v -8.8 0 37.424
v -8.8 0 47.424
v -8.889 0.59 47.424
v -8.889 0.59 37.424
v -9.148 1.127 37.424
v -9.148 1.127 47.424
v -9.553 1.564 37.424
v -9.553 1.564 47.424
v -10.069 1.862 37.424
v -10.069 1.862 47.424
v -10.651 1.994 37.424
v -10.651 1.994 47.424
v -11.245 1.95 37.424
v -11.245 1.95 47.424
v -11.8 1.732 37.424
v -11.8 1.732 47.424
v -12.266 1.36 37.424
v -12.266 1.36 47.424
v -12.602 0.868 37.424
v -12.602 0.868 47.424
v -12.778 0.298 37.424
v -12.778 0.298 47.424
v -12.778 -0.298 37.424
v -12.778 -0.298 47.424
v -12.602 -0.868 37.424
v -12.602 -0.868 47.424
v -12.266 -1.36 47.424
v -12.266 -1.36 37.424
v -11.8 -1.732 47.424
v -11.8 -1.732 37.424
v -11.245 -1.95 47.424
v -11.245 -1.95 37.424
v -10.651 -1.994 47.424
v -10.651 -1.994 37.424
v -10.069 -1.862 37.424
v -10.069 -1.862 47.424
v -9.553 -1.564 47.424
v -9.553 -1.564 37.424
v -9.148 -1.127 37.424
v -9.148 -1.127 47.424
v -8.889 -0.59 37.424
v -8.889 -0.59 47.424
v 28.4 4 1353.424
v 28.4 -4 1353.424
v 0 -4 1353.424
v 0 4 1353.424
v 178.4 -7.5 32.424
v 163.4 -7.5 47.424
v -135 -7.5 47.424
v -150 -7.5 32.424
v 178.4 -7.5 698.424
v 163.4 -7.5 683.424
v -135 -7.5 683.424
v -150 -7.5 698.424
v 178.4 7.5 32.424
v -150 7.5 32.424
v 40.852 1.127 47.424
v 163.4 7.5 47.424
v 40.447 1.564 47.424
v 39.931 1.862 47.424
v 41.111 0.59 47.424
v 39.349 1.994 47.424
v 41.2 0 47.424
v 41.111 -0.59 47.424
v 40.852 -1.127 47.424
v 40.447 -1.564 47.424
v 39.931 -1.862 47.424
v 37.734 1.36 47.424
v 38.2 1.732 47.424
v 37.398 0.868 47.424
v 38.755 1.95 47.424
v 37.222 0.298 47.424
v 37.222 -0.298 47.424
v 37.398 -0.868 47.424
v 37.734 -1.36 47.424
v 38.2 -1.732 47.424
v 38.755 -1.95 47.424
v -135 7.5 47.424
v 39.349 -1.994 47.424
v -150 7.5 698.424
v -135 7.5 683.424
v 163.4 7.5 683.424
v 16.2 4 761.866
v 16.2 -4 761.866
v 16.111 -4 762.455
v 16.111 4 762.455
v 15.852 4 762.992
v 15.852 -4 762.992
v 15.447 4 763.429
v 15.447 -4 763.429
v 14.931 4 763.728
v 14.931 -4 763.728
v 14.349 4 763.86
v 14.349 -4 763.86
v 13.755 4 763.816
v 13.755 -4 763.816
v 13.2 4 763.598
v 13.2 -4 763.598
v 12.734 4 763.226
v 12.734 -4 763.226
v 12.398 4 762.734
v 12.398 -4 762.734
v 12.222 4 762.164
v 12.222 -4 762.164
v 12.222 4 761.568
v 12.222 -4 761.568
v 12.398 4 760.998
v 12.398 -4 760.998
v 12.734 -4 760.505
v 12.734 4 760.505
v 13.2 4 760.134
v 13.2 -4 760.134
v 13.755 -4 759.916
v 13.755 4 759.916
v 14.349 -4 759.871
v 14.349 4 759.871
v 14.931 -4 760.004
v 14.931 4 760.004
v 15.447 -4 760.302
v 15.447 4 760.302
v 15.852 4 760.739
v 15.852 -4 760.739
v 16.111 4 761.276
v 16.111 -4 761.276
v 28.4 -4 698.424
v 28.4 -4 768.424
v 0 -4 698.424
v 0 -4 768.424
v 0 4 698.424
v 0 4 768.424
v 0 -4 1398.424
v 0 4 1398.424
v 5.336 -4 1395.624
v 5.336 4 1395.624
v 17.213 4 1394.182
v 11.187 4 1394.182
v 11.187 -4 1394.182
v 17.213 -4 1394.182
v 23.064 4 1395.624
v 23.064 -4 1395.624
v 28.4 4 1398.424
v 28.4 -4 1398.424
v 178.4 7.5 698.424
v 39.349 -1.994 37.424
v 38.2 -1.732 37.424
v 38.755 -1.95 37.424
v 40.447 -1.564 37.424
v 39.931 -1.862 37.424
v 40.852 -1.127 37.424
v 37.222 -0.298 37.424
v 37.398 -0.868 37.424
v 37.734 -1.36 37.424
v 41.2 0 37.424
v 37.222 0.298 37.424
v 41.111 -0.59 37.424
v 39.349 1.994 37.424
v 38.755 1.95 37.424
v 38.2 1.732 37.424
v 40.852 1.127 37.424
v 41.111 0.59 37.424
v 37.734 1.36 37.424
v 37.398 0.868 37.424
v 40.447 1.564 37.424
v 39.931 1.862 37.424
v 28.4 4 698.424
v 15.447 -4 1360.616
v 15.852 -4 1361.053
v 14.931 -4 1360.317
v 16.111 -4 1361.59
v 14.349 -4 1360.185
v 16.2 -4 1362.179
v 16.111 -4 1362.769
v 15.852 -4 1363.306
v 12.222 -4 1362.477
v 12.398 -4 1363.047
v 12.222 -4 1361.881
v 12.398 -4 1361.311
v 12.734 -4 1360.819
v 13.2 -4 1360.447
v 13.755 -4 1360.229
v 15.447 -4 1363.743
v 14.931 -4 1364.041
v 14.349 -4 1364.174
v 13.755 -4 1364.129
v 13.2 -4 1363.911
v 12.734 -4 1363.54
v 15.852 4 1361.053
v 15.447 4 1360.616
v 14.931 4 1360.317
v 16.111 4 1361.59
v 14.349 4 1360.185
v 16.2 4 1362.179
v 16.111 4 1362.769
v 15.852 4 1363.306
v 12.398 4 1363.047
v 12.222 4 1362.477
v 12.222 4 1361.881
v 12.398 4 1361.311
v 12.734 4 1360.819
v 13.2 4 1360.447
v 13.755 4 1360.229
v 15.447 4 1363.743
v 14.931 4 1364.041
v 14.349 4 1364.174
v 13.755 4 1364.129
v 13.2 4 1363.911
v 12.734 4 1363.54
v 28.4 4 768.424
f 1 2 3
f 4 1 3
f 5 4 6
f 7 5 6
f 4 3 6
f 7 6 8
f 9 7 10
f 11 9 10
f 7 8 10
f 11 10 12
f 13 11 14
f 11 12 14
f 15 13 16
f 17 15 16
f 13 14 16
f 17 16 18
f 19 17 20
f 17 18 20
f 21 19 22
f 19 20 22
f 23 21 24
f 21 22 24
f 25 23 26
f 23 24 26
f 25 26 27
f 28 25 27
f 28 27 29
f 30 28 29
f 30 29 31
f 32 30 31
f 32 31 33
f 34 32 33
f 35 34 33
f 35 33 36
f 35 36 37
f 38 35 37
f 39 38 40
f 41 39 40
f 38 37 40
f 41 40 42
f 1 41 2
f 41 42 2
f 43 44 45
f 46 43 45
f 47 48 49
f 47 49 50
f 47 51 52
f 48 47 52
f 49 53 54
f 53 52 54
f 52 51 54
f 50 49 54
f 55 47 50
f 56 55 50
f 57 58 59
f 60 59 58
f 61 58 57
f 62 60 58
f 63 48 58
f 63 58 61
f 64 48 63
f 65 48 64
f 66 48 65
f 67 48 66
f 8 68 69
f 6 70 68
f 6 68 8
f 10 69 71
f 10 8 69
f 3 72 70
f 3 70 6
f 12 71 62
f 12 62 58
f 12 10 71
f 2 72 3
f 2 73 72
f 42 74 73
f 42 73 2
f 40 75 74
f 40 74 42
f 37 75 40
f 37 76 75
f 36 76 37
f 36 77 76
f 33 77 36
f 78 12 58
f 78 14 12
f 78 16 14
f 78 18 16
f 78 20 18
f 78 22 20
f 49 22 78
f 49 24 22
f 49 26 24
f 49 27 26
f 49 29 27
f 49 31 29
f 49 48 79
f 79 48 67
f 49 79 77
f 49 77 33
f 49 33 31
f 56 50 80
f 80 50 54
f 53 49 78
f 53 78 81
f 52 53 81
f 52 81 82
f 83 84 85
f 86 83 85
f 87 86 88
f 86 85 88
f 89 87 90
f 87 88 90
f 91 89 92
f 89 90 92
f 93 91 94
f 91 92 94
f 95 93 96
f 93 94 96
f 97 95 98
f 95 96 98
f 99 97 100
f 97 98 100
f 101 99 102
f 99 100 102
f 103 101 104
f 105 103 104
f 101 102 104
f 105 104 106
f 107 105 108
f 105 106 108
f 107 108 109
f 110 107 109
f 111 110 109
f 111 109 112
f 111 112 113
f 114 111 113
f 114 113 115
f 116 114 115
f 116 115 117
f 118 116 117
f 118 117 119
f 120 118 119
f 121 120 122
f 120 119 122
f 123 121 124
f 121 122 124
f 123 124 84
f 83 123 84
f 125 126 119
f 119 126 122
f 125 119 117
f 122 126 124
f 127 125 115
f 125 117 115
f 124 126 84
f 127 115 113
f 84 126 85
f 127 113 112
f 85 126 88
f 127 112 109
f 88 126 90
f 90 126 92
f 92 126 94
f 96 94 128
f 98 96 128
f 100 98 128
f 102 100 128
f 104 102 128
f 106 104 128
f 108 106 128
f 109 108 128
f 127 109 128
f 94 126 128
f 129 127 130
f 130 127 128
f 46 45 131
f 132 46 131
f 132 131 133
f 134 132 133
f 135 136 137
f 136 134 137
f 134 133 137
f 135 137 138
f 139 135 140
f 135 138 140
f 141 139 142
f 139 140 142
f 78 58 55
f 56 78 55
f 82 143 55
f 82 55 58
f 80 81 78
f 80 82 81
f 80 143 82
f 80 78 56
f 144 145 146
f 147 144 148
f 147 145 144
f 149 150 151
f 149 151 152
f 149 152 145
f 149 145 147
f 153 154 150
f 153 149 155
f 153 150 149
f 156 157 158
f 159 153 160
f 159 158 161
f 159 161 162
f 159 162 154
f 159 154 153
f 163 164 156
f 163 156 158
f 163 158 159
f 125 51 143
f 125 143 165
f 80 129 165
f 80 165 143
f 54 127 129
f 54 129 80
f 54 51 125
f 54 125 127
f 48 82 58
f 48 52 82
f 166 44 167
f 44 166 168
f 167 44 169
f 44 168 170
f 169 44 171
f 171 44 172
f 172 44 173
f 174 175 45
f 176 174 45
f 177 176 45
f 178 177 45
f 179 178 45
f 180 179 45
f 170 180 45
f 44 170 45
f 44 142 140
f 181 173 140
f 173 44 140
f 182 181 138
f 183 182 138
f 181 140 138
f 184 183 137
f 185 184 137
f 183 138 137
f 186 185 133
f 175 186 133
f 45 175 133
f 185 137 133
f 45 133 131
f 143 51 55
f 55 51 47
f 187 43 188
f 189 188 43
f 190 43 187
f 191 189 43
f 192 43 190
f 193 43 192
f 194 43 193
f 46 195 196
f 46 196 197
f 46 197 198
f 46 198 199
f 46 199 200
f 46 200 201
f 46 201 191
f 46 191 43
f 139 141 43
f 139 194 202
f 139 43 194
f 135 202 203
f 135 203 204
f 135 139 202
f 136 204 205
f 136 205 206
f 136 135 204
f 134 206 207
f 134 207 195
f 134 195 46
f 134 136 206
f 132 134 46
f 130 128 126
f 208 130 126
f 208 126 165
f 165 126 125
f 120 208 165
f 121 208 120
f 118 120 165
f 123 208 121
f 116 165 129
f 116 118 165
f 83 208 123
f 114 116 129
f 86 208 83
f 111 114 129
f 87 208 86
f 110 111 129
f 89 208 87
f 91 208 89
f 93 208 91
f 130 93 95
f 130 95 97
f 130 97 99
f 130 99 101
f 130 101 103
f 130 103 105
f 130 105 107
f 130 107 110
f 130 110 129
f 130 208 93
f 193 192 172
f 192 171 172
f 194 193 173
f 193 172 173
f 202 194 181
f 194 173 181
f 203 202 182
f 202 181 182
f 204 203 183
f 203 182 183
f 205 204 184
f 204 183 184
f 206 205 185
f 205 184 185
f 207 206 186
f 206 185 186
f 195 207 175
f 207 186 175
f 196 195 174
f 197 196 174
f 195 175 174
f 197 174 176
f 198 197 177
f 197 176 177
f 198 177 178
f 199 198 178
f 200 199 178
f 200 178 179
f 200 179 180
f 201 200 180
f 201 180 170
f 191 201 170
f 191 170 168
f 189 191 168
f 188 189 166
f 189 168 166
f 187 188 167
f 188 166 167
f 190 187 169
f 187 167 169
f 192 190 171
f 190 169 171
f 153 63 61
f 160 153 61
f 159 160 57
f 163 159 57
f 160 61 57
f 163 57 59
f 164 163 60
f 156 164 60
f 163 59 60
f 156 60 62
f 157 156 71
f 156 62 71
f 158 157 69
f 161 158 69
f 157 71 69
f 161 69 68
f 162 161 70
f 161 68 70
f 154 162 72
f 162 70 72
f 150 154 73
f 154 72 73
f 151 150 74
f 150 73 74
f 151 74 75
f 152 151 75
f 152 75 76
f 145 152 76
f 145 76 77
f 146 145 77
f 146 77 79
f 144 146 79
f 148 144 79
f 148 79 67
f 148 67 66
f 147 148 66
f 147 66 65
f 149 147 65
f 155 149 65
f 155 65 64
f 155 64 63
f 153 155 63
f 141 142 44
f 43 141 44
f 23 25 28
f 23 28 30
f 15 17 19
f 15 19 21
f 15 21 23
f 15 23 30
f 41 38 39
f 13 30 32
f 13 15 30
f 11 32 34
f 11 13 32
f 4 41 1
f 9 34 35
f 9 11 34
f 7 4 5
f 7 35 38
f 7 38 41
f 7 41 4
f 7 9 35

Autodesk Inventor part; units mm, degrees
ref_plane "YZ Plane" through (0, 0, 0) normal (1, 0, 0) x (0, 1, 0)
ref_plane "XZ Plane" through (0, 0, 0) normal (0, 1, 0) x (-1, 0, 0)
sketch "Boceto2" plane through (0, 0, 0) normal (0, 1, 0) x (-1, 0, 0)
  line L0 (350, 0) -> (-350, 0)
  line L1 (-350, 0) -> (-350, 1000)
  line L2 (-120, 1500) -> (80, 1500)
  line L3 (350, 1000) -> (350, 0)
  line L4 (80, 1000) -> (80, 1500)
  line L5 (-120, 1000) -> (-120, 1500)
  line L6 (350, 1000) -> (80, 1000)
  line L7 (-120, 1000) -> (-350, 1000)
  arc A0 (-28.4, 1398.4243) -> (0, 1398.4243) centre (-14.2, 1419) ccw
  line L8 (-28.4, 1398.4243) -> (-28.4, 698.4243)
  line L9 (-28.4, 698.4243) -> (0, 698.4243)
  line L10 (0, 698.4243) -> (0, 1398.4243)
  line L11 (150, 698.4243) -> (-178.4, 698.4243)
  line L12 (-178.4, 698.4243) -> (-178.4, 32.4243)
  line L13 (-178.4, 32.4243) -> (150, 32.4243)
  line L14 (150, 32.4243) -> (150, 698.4243)
  point P0 (-14.2, 698.4243)
  dimension "d16" = 105.8
  dimension "d17" = 81
  dimension "d18" = 700
  dimension "d19" = 28.4
  dimension "d21" = 666
  dimension "d22" = 150
  dimension "d23" = 150
  dimension "d24" = 0
extrude "Extrusión1" add sketch "Boceto2" along normal mid plane 15 contours L9 L11 L14 L13 L12
extrude "Extrusión2" add sketch "Boceto2" along normal mid plane 8 contours A0 L10 L9 L8
sketch "Boceto3" plane through (0, -7.5, 0) normal (0, -1, 0) x (1, 0, 0)
  line L0 (-150, 698.4243) -> (178.4, 698.4243) projected
  line L1 (178.4, 698.4243) -> (178.4, 32.4243) projected
  line L2 (-150, 698.4243) -> (178.4, 698.4243)
  line L3 (178.4, 698.4243) -> (178.4, 32.4243)
  line L4 (178.4, 32.4243) -> (-150, 32.4243)
  line L5 (-150, 32.4243) -> (-150, 698.4243)
  line L6 (-135, 683.4243) -> (163.4, 683.4243)
  line L7 (163.4, 683.4243) -> (163.4, 47.4243)
  line L8 (163.4, 47.4243) -> (-135, 47.4243)
  line L9 (-135, 47.4243) -> (-135, 683.4243)
  point P0 (0, 0)
  dimension "d29" = 15
  dimension "d30" = 15
  dimension "d31" = 15
  dimension "d32" = 15
  dimension "d49" = 666
extrude "Extrusión3" cut sketch "Boceto3" against normal blind 15 contours L6 L7 L8 L9
sketch "Boceto4" plane through (0, -4, 0) normal (0, -1, 0) x (1, 0, 0)
  line L0 (0, 698.4243) -> (0, 1398.4243) projected
  line L1 (28.4, 1398.4243) -> (28.4, 698.4243) projected
  line L2 (0, 768.4243) -> (28.4, 768.4243)
  line L3 (28.4, 768.4243) -> (28.4, 1353.4243)
  line L4 (28.4, 1353.4243) -> (0, 1353.4243)
  line L5 (0, 1353.4243) -> (0, 768.4243)
  line L6 (178.4, 698.4243) -> (-150, 698.4243) projected
  circle A0 centre (14.2, 1362.1792) radius 2
  circle A1 centre (14.2, 761.8658) radius 2
  point P0 (0, 0)
  point P1 (14.2, 698.4243)
  point P2 (14.2, 1353.4243)
  point P3 (0, 1353.4243)
  dimension "d35" = 70
  dimension "d36" = 45
  dimension "d37" = 4
  dimension "d38" = 4
extrude "Extrusión4" cut sketch "Boceto4" against normal blind 15 contours L0 L4 L1 L2 | A0 | A1
ref_plane "Plano de trabajo1" through (0, 0, 0) normal (0, -1, 0) x (1, 0, 0)
sketch "Boceto5" plane through (0, 0, 0) normal (0, -1, 0) x (1, 0, 0)
  circle A0 centre (14.2, 1362.1792) radius 2
  point P0 (0, 0)
  point P1 (14.2, 761.8658)
  point P2 (14.2, 759.8658)
  point P3 (14.2, 763.8658)
  point P4 (14.2, 1364.1792)
  point P5 (14.2, 1360.1792)
sketch "Boceto6" plane through (178.4, 7.5, 32.4243) normal (0, 0, -1) x (-1, 0, 0)
  line L0 (0, -15) -> (0, 0) projected
  line L1 (0, 0) -> (328.4, 0) projected
  point P0 (178.4, -7.5)
  point P1 (164.2, -7.5)
  point P2 (0, -7.5)
  dimension "d41" = 164.2
  dimension "d42" = 7.5
sketch "Boceto7" plane through (-135, -7.5, 47.4243) normal (0, 0, 1) x (1, 0, 0)
  circle A0 centre (124.2, 7.5) radius 2
  circle A1 centre (174.2, 7.5) radius 2
  line L0 (0, 0) -> (0, 15) projected
  line L1 (0, 15) -> (298.4, 15) projected
  point P0 (135, 7.5)
  point P1 (0, 7.5)
  dimension "d50" = 4
  dimension "d51" = 4
  dimension "d52" = 124.2
  dimension "d53" = 174.2
  dimension "d54" = 50
  dimension "d55" = 7.5
extrude "Extrusión5" cut sketch "Boceto7" against normal blind 10
properties part number "Marco"
